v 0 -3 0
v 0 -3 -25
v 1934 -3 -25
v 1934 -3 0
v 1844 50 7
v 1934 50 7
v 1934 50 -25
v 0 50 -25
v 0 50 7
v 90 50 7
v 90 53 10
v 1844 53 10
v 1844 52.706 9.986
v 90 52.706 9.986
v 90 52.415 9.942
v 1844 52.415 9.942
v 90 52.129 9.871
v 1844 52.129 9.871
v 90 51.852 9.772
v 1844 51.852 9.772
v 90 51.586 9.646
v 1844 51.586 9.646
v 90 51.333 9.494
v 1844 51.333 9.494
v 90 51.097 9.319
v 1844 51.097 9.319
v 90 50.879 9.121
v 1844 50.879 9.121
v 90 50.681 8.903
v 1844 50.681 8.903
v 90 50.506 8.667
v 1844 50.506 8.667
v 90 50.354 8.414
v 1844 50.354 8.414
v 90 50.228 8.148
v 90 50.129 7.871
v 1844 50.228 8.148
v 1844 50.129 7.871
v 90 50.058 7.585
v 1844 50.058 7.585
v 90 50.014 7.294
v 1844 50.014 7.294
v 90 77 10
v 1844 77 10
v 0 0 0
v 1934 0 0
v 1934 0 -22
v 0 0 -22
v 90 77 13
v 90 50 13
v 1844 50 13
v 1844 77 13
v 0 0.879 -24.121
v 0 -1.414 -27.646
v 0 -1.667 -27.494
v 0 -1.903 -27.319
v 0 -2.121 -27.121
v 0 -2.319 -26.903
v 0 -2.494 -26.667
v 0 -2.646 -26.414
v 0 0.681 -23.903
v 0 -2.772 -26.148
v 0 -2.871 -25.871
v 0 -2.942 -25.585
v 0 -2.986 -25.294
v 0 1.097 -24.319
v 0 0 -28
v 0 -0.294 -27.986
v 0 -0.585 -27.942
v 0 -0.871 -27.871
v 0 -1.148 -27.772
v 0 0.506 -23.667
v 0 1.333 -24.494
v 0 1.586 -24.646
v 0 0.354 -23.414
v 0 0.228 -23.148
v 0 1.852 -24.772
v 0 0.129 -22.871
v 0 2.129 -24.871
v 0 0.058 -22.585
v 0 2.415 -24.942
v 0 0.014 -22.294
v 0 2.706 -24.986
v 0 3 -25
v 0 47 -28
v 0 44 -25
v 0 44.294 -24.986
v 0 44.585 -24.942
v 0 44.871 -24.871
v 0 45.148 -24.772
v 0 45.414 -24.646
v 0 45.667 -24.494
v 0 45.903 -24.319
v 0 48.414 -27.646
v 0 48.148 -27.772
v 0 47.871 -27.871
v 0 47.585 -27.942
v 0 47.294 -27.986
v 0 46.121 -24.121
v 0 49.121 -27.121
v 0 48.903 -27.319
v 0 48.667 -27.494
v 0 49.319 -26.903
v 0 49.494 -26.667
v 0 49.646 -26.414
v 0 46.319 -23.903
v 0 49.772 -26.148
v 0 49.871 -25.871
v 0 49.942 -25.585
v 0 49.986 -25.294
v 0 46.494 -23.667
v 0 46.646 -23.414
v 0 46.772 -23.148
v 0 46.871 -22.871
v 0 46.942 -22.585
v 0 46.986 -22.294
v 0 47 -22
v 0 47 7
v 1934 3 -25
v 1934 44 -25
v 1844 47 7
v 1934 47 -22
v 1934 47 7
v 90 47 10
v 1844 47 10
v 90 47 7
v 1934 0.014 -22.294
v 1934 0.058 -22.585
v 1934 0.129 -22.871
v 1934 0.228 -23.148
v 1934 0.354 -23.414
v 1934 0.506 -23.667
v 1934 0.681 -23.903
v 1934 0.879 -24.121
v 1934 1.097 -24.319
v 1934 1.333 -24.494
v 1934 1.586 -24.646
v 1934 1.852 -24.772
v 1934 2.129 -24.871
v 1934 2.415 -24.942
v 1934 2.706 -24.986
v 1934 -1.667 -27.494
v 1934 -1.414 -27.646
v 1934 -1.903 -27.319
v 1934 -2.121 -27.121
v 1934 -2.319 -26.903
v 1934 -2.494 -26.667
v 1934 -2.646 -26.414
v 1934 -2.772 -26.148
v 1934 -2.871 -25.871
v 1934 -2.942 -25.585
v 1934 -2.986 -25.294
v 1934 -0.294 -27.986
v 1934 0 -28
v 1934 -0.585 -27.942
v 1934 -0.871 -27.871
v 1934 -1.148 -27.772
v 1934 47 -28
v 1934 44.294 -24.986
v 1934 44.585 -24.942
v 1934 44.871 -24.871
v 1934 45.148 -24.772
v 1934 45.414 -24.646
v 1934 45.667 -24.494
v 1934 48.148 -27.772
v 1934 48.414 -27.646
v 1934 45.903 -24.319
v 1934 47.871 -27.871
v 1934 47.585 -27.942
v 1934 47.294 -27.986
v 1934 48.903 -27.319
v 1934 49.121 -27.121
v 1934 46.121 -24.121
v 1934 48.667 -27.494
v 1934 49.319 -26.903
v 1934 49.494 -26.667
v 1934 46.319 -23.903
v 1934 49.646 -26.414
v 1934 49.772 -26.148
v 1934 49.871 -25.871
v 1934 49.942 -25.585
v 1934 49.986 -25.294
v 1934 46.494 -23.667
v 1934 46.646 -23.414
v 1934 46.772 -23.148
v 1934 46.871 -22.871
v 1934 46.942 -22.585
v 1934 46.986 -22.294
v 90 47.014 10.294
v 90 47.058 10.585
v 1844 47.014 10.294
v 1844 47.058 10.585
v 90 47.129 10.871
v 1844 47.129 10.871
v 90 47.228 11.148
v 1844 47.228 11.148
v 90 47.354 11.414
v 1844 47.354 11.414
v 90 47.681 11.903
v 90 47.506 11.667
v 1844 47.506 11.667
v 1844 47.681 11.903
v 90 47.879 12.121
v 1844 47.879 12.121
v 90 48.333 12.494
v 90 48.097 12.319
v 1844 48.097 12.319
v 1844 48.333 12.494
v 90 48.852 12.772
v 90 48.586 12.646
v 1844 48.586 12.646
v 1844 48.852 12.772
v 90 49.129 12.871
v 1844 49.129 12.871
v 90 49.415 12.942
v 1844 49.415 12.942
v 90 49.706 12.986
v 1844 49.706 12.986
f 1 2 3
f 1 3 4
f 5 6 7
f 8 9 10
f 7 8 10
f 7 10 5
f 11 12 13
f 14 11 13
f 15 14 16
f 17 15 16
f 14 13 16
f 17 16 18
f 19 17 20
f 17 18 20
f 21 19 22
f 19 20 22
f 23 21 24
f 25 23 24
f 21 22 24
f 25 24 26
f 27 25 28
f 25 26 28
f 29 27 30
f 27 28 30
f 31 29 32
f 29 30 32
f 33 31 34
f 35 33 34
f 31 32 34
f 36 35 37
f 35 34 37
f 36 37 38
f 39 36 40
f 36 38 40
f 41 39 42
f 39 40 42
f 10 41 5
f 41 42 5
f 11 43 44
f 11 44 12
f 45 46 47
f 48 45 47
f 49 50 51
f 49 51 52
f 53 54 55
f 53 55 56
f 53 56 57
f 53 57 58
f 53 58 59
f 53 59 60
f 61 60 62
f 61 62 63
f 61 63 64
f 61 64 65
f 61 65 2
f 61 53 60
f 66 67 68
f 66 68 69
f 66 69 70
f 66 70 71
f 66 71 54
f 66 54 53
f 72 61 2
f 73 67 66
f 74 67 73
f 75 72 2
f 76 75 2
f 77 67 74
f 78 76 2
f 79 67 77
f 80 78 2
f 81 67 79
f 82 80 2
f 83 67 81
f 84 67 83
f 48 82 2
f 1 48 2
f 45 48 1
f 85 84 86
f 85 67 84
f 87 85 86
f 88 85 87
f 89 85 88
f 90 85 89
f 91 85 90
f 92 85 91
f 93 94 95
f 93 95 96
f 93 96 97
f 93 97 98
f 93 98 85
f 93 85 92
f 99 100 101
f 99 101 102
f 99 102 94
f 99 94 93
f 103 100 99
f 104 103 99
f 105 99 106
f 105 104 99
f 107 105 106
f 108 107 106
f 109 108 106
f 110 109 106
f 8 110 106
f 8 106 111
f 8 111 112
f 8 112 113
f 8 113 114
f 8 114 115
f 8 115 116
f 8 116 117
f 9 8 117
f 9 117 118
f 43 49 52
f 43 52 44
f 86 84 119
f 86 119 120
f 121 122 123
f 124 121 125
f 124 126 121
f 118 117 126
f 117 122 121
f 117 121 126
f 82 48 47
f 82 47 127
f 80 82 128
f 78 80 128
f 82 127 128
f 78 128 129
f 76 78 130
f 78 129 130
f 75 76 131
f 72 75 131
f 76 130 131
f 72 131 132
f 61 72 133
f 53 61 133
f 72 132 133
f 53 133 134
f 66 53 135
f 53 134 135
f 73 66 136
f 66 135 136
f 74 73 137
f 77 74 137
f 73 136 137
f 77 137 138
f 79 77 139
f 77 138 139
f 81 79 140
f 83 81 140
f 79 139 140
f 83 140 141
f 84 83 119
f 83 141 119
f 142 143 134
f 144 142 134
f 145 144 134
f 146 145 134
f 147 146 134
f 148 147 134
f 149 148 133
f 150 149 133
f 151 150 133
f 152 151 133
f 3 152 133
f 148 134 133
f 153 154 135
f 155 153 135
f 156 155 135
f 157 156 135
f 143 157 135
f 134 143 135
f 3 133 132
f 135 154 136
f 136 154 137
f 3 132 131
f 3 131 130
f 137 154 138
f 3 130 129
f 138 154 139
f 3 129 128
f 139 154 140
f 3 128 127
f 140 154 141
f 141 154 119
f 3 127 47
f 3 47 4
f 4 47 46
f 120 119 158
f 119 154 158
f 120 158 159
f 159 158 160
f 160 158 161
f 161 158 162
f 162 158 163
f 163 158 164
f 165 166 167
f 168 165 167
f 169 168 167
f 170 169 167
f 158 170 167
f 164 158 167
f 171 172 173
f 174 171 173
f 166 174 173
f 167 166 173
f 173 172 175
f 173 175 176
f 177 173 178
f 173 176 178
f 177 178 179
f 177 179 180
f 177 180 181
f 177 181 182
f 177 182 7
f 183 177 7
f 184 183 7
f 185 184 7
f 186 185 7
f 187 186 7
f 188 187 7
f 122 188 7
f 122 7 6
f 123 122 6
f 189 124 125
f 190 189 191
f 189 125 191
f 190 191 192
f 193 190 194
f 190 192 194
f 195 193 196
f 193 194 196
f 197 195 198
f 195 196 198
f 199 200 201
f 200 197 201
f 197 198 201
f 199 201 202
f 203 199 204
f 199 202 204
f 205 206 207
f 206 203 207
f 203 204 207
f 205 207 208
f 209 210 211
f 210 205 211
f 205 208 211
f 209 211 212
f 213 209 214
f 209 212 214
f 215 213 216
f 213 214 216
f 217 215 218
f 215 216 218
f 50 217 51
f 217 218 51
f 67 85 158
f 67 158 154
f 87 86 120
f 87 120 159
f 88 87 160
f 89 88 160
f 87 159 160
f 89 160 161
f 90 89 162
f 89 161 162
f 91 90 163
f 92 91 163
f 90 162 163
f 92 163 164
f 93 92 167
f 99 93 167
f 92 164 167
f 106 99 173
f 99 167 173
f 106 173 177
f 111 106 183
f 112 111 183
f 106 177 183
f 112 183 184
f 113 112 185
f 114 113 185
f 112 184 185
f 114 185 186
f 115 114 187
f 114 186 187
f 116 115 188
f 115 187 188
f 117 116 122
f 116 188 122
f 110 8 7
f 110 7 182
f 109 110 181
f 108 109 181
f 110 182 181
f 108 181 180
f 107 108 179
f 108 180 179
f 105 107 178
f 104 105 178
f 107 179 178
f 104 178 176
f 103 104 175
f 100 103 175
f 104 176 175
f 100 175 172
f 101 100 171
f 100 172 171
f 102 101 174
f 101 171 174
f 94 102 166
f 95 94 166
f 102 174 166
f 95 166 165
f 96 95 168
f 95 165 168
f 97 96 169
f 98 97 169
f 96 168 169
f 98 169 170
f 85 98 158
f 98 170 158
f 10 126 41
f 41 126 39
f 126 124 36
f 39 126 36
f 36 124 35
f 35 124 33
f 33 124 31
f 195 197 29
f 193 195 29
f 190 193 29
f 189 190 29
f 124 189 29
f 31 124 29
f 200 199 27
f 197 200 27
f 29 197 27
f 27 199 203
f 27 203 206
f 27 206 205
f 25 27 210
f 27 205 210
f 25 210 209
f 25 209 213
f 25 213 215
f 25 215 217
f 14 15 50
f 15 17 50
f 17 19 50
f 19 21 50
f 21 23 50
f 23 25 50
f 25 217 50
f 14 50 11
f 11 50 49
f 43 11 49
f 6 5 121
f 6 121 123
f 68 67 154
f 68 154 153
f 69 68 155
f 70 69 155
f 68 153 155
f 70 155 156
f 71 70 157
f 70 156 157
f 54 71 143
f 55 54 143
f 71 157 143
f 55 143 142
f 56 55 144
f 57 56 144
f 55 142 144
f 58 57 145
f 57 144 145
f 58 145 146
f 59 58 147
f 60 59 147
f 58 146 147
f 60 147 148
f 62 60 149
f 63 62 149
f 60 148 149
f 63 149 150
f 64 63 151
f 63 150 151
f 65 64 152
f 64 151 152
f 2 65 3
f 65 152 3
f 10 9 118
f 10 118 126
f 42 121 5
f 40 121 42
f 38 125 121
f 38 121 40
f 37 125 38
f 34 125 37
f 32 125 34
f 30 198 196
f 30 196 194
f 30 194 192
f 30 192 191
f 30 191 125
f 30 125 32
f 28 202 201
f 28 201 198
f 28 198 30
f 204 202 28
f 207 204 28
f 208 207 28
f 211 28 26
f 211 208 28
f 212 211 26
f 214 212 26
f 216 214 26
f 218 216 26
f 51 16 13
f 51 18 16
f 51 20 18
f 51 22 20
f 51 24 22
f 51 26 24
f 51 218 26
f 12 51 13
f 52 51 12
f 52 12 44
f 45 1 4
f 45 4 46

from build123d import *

# Parameters (mm, degrees)
BOSS_EXTRUDE1_DEPTH = 1934
FILLET1_R           = 3
SKETCH2_W           = 90
SKETCH2_H           = 30
CUT_EXTRUDE1_DEPTH  = 6
SKETCH3_W           = 90
SKETCH3_H           = 30
CUT_EXTRUDE2_DEPTH  = 6


with BuildPart() as part:
    # Sketch1 → Boss-Extrude1 (new body)
    with BuildSketch(Plane(origin=(0, 0, 0), x_dir=(0, 0, -1), z_dir=(1, 0, 0))):
        Polygon((0, 0), (25, 0), (25, 47), (-13, 47), (-13, 77), (-10, 77), (-10, 50), (28, 50), (28, -3), (0, -3), align=None)
    extrude(amount=BOSS_EXTRUDE1_DEPTH)

    # Fillet1
    fillet1_edges = [part.edges().sort_by_distance(p)[0] for p in [
        (967, 0, -25),
        (967, 47, -25),
        (967, 47, 13),
        (967, 50, 10),
        (967, 50, -28),
        (967, -3, -28),
    ]]
    fillet(fillet1_edges, radius=FILLET1_R)

    # Sketch2 → Cut-Extrude1 (cut)
    with BuildSketch(Plane.XY.offset(13)):
        with Locations((45, 62)):
            Rectangle(SKETCH2_W, SKETCH2_H)
    extrude(amount=-CUT_EXTRUDE1_DEPTH, mode=Mode.SUBTRACT)

    # Sketch3 → Cut-Extrude2 (cut)
    with BuildSketch(Plane.XY.offset(13)):
        with Locations((1889, 62)):
            Rectangle(SKETCH3_W, SKETCH3_H)
    extrude(amount=-CUT_EXTRUDE2_DEPTH, mode=Mode.SUBTRACT)


solid = part.part
